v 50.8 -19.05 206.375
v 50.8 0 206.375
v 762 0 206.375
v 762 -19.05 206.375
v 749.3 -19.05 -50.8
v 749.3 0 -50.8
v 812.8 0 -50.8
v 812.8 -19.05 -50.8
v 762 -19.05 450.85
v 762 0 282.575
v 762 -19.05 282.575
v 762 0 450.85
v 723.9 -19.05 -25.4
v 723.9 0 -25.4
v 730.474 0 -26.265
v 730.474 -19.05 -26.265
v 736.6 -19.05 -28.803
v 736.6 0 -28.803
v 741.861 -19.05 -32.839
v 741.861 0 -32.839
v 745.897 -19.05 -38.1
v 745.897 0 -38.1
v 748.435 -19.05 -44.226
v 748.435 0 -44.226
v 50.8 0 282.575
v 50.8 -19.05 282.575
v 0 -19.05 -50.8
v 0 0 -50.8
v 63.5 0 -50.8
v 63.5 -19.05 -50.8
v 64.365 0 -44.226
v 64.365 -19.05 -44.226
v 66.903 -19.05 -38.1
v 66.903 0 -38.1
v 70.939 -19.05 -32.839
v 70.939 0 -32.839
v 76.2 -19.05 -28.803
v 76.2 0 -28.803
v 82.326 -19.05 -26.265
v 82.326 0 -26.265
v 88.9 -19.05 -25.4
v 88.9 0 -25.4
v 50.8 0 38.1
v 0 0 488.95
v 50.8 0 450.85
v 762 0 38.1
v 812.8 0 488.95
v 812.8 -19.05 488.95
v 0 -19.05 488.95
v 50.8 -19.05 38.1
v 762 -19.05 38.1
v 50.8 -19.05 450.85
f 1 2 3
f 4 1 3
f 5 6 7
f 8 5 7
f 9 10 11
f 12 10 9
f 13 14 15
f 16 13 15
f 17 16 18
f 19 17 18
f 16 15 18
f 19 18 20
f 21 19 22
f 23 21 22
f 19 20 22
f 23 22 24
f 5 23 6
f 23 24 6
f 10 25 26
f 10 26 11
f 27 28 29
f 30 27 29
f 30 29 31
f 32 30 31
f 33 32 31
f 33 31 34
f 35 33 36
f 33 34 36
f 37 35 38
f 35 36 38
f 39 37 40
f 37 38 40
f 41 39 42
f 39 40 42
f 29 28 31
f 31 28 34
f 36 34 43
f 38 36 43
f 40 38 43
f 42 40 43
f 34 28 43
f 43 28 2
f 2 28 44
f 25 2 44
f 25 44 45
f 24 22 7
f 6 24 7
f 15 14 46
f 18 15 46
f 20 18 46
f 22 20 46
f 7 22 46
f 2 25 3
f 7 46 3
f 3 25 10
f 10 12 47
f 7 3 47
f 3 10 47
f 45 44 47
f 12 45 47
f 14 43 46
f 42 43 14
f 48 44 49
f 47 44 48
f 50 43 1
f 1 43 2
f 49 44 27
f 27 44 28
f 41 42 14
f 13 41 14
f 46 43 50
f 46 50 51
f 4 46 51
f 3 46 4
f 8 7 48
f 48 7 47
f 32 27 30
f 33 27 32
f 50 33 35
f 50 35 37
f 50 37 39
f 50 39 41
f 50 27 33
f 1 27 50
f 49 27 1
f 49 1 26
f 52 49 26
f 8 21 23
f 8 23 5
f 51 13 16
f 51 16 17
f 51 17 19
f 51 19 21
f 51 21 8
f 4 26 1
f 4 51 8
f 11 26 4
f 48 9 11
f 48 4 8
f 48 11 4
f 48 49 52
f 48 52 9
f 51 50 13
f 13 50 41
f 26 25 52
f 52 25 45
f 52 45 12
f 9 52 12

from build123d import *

# Parameters (mm, degrees)
F0_W     = 812.8
F0_H     = 488.95
F0_W_2   = 711.2
F0_H_2   = 168.275
F1_DEPTH = 19.05


with BuildPart() as f1:
    # F0 (on Front) → F1 (new body)
    with BuildSketch(Plane.XZ):
        with BuildLine():
            Line((812.8, 0), (0, 0))
            Line((0, 0), (0, -50.8))
            Line((0, -50.8), (63.5, -50.8))
            ThreePointArc((63.5, -50.8), (70.939488, -32.839488), (88.9, -25.4))
            Line((88.9, -25.4), (406.4, -25.4))
            Line((406.4, -25.4), (723.9, -25.4))
            ThreePointArc((723.9, -25.4), (741.860512, -32.839488), (749.3, -50.8))
            Line((749.3, -50.8), (812.8, -50.8))
            Line((812.8, -50.8), (812.8, 0))
        make_face()
        with Locations((406.4, 244.475)):
            Rectangle(F0_W, F0_H)
        with Locations((406.4, 122.2375)):
            Rectangle(F0_W_2, F0_H_2, mode=Mode.SUBTRACT)
        with Locations((406.4, 366.7125)):
            Rectangle(F0_W_2, F0_H_2, mode=Mode.SUBTRACT)
    extrude(amount=F1_DEPTH)


solid = f1.part
